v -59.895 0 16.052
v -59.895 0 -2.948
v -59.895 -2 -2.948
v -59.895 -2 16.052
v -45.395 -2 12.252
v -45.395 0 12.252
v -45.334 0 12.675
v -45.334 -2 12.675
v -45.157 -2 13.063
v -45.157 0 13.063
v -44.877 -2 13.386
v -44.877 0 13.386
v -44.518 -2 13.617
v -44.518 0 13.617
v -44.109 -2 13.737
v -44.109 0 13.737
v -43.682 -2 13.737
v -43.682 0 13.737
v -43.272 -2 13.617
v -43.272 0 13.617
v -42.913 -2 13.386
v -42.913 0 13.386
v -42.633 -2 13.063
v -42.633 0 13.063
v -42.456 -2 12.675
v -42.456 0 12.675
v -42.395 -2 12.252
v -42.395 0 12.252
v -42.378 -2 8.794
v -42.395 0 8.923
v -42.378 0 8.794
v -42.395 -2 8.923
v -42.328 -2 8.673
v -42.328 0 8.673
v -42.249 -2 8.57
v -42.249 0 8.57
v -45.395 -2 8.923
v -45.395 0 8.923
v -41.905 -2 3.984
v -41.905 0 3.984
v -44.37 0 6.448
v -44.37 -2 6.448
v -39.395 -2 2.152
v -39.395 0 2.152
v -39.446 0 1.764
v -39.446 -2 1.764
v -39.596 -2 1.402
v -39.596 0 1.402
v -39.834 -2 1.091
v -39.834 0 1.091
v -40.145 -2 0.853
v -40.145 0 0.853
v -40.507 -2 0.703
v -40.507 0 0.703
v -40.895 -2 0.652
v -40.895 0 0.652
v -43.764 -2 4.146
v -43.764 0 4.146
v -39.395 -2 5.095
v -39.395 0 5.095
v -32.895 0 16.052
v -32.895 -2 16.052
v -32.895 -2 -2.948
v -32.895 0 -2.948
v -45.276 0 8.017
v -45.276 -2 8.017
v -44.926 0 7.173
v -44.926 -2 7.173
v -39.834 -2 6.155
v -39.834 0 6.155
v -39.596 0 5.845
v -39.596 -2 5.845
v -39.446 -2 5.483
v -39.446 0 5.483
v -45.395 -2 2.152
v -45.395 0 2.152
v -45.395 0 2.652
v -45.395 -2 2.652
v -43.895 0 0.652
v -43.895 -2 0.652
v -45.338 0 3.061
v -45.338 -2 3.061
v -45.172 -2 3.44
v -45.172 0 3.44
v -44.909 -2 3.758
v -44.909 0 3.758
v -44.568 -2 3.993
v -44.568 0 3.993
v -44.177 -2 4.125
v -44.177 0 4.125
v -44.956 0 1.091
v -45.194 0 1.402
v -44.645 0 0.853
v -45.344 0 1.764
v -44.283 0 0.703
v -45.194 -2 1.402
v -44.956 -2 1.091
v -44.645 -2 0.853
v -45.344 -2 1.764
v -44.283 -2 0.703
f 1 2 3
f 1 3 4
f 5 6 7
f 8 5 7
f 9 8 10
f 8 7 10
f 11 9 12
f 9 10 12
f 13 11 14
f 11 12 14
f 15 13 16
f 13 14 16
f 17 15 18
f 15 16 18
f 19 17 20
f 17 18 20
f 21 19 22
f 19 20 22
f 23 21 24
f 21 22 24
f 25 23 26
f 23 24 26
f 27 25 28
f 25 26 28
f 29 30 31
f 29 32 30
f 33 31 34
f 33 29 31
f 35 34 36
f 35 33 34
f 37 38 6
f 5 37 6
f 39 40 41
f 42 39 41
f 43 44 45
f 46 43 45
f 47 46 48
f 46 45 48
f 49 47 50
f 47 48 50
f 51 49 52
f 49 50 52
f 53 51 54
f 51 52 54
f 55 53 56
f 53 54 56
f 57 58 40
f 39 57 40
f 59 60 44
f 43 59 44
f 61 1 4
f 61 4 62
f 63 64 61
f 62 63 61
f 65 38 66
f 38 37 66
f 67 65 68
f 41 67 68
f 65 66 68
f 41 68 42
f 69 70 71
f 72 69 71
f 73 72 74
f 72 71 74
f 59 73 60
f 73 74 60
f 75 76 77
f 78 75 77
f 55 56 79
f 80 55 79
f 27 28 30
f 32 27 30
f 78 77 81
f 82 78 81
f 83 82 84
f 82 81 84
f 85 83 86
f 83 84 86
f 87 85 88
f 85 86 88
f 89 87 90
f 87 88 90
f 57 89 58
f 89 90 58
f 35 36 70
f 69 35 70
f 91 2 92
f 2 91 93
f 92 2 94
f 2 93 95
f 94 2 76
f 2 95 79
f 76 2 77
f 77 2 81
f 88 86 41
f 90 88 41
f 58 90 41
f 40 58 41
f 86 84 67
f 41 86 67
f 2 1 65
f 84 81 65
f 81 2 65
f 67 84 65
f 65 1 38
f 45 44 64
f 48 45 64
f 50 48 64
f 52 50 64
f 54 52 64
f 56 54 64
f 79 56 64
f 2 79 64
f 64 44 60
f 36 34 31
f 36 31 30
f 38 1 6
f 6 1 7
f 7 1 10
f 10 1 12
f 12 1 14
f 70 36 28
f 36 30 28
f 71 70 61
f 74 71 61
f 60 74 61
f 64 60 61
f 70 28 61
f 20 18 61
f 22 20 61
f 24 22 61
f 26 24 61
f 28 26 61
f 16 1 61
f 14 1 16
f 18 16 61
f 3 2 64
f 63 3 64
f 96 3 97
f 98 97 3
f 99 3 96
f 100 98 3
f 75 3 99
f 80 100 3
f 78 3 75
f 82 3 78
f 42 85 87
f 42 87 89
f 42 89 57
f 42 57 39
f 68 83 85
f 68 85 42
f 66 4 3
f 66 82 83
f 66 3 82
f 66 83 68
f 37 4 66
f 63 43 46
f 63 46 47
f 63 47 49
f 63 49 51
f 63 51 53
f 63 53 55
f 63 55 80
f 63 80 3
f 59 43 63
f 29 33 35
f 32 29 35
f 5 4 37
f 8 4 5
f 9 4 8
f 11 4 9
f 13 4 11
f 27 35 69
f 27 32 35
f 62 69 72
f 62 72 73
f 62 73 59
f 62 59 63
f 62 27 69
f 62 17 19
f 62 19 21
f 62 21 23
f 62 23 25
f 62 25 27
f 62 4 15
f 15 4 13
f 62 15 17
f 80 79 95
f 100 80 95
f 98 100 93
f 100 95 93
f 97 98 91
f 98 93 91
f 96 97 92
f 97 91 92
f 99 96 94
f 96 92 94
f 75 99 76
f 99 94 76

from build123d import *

# Parameters (mm, degrees)
F0_W     = 27
F0_H     = 19
F1_DEPTH = 2
F2_R     = 3.5
F3_R     = 0.5


with BuildPart() as f1:
    # F0 (on Front) → F1 (new body)
    with BuildSketch(Plane.XZ):
        with Locations((-46.395146, 6.552132)):
            Rectangle(F0_W, F0_H)
        with BuildLine():
            ThreePointArc((-45.395146, 12.252132), (-43.895146, 13.752132), (-42.395146, 12.252132))
            Line((-42.395146, 12.252132), (-42.395146, 8.716104))
            Line((-42.395146, 8.716104), (-39.834486, 6.155444))
            ThreePointArc((-39.834486, 6.155444), (-39.509326, 5.668809), (-39.395146, 5.094783))
            Line((-39.395146, 5.094783), (-39.395146, 2.152132))
            ThreePointArc((-39.395146, 2.152132), (-39.834486, 1.091472), (-40.895146, 0.652132))
            Line((-40.895146, 0.652132), (-43.895146, 0.652132))
            ThreePointArc((-43.895146, 0.652132), (-44.955806, 1.091472), (-45.395146, 2.152132))
            Line((-45.395146, 2.152132), (-45.395146, 2.652132))
            ThreePointArc((-45.395146, 2.652132), (-44.908531, 3.758048), (-43.764412, 4.146424))
            Line((-43.764412, 4.146424), (-41.90547, 3.983787))
            Line((-41.90547, 3.983787), (-41.955806, 4.034123))
            Line((-41.955806, 4.034123), (-45.395146, 7.473463))
            Line((-45.395146, 7.473463), (-45.395146, 12.252132))
        make_face(mode=Mode.SUBTRACT)
    extrude(amount=F1_DEPTH)

    # F2
    f2_edges = [f1.edges().sort_by_distance(p)[0] for p in [
        (-45.395146, -1, 7.473463),
    ]]
    fillet(f2_edges, radius=F2_R)

    # F3
    f3_edges = [f1.edges().sort_by_distance(p)[0] for p in [
        (-42.395146, -1, 8.716104),
    ]]
    fillet(f3_edges, radius=F3_R)


solid = f1.part
